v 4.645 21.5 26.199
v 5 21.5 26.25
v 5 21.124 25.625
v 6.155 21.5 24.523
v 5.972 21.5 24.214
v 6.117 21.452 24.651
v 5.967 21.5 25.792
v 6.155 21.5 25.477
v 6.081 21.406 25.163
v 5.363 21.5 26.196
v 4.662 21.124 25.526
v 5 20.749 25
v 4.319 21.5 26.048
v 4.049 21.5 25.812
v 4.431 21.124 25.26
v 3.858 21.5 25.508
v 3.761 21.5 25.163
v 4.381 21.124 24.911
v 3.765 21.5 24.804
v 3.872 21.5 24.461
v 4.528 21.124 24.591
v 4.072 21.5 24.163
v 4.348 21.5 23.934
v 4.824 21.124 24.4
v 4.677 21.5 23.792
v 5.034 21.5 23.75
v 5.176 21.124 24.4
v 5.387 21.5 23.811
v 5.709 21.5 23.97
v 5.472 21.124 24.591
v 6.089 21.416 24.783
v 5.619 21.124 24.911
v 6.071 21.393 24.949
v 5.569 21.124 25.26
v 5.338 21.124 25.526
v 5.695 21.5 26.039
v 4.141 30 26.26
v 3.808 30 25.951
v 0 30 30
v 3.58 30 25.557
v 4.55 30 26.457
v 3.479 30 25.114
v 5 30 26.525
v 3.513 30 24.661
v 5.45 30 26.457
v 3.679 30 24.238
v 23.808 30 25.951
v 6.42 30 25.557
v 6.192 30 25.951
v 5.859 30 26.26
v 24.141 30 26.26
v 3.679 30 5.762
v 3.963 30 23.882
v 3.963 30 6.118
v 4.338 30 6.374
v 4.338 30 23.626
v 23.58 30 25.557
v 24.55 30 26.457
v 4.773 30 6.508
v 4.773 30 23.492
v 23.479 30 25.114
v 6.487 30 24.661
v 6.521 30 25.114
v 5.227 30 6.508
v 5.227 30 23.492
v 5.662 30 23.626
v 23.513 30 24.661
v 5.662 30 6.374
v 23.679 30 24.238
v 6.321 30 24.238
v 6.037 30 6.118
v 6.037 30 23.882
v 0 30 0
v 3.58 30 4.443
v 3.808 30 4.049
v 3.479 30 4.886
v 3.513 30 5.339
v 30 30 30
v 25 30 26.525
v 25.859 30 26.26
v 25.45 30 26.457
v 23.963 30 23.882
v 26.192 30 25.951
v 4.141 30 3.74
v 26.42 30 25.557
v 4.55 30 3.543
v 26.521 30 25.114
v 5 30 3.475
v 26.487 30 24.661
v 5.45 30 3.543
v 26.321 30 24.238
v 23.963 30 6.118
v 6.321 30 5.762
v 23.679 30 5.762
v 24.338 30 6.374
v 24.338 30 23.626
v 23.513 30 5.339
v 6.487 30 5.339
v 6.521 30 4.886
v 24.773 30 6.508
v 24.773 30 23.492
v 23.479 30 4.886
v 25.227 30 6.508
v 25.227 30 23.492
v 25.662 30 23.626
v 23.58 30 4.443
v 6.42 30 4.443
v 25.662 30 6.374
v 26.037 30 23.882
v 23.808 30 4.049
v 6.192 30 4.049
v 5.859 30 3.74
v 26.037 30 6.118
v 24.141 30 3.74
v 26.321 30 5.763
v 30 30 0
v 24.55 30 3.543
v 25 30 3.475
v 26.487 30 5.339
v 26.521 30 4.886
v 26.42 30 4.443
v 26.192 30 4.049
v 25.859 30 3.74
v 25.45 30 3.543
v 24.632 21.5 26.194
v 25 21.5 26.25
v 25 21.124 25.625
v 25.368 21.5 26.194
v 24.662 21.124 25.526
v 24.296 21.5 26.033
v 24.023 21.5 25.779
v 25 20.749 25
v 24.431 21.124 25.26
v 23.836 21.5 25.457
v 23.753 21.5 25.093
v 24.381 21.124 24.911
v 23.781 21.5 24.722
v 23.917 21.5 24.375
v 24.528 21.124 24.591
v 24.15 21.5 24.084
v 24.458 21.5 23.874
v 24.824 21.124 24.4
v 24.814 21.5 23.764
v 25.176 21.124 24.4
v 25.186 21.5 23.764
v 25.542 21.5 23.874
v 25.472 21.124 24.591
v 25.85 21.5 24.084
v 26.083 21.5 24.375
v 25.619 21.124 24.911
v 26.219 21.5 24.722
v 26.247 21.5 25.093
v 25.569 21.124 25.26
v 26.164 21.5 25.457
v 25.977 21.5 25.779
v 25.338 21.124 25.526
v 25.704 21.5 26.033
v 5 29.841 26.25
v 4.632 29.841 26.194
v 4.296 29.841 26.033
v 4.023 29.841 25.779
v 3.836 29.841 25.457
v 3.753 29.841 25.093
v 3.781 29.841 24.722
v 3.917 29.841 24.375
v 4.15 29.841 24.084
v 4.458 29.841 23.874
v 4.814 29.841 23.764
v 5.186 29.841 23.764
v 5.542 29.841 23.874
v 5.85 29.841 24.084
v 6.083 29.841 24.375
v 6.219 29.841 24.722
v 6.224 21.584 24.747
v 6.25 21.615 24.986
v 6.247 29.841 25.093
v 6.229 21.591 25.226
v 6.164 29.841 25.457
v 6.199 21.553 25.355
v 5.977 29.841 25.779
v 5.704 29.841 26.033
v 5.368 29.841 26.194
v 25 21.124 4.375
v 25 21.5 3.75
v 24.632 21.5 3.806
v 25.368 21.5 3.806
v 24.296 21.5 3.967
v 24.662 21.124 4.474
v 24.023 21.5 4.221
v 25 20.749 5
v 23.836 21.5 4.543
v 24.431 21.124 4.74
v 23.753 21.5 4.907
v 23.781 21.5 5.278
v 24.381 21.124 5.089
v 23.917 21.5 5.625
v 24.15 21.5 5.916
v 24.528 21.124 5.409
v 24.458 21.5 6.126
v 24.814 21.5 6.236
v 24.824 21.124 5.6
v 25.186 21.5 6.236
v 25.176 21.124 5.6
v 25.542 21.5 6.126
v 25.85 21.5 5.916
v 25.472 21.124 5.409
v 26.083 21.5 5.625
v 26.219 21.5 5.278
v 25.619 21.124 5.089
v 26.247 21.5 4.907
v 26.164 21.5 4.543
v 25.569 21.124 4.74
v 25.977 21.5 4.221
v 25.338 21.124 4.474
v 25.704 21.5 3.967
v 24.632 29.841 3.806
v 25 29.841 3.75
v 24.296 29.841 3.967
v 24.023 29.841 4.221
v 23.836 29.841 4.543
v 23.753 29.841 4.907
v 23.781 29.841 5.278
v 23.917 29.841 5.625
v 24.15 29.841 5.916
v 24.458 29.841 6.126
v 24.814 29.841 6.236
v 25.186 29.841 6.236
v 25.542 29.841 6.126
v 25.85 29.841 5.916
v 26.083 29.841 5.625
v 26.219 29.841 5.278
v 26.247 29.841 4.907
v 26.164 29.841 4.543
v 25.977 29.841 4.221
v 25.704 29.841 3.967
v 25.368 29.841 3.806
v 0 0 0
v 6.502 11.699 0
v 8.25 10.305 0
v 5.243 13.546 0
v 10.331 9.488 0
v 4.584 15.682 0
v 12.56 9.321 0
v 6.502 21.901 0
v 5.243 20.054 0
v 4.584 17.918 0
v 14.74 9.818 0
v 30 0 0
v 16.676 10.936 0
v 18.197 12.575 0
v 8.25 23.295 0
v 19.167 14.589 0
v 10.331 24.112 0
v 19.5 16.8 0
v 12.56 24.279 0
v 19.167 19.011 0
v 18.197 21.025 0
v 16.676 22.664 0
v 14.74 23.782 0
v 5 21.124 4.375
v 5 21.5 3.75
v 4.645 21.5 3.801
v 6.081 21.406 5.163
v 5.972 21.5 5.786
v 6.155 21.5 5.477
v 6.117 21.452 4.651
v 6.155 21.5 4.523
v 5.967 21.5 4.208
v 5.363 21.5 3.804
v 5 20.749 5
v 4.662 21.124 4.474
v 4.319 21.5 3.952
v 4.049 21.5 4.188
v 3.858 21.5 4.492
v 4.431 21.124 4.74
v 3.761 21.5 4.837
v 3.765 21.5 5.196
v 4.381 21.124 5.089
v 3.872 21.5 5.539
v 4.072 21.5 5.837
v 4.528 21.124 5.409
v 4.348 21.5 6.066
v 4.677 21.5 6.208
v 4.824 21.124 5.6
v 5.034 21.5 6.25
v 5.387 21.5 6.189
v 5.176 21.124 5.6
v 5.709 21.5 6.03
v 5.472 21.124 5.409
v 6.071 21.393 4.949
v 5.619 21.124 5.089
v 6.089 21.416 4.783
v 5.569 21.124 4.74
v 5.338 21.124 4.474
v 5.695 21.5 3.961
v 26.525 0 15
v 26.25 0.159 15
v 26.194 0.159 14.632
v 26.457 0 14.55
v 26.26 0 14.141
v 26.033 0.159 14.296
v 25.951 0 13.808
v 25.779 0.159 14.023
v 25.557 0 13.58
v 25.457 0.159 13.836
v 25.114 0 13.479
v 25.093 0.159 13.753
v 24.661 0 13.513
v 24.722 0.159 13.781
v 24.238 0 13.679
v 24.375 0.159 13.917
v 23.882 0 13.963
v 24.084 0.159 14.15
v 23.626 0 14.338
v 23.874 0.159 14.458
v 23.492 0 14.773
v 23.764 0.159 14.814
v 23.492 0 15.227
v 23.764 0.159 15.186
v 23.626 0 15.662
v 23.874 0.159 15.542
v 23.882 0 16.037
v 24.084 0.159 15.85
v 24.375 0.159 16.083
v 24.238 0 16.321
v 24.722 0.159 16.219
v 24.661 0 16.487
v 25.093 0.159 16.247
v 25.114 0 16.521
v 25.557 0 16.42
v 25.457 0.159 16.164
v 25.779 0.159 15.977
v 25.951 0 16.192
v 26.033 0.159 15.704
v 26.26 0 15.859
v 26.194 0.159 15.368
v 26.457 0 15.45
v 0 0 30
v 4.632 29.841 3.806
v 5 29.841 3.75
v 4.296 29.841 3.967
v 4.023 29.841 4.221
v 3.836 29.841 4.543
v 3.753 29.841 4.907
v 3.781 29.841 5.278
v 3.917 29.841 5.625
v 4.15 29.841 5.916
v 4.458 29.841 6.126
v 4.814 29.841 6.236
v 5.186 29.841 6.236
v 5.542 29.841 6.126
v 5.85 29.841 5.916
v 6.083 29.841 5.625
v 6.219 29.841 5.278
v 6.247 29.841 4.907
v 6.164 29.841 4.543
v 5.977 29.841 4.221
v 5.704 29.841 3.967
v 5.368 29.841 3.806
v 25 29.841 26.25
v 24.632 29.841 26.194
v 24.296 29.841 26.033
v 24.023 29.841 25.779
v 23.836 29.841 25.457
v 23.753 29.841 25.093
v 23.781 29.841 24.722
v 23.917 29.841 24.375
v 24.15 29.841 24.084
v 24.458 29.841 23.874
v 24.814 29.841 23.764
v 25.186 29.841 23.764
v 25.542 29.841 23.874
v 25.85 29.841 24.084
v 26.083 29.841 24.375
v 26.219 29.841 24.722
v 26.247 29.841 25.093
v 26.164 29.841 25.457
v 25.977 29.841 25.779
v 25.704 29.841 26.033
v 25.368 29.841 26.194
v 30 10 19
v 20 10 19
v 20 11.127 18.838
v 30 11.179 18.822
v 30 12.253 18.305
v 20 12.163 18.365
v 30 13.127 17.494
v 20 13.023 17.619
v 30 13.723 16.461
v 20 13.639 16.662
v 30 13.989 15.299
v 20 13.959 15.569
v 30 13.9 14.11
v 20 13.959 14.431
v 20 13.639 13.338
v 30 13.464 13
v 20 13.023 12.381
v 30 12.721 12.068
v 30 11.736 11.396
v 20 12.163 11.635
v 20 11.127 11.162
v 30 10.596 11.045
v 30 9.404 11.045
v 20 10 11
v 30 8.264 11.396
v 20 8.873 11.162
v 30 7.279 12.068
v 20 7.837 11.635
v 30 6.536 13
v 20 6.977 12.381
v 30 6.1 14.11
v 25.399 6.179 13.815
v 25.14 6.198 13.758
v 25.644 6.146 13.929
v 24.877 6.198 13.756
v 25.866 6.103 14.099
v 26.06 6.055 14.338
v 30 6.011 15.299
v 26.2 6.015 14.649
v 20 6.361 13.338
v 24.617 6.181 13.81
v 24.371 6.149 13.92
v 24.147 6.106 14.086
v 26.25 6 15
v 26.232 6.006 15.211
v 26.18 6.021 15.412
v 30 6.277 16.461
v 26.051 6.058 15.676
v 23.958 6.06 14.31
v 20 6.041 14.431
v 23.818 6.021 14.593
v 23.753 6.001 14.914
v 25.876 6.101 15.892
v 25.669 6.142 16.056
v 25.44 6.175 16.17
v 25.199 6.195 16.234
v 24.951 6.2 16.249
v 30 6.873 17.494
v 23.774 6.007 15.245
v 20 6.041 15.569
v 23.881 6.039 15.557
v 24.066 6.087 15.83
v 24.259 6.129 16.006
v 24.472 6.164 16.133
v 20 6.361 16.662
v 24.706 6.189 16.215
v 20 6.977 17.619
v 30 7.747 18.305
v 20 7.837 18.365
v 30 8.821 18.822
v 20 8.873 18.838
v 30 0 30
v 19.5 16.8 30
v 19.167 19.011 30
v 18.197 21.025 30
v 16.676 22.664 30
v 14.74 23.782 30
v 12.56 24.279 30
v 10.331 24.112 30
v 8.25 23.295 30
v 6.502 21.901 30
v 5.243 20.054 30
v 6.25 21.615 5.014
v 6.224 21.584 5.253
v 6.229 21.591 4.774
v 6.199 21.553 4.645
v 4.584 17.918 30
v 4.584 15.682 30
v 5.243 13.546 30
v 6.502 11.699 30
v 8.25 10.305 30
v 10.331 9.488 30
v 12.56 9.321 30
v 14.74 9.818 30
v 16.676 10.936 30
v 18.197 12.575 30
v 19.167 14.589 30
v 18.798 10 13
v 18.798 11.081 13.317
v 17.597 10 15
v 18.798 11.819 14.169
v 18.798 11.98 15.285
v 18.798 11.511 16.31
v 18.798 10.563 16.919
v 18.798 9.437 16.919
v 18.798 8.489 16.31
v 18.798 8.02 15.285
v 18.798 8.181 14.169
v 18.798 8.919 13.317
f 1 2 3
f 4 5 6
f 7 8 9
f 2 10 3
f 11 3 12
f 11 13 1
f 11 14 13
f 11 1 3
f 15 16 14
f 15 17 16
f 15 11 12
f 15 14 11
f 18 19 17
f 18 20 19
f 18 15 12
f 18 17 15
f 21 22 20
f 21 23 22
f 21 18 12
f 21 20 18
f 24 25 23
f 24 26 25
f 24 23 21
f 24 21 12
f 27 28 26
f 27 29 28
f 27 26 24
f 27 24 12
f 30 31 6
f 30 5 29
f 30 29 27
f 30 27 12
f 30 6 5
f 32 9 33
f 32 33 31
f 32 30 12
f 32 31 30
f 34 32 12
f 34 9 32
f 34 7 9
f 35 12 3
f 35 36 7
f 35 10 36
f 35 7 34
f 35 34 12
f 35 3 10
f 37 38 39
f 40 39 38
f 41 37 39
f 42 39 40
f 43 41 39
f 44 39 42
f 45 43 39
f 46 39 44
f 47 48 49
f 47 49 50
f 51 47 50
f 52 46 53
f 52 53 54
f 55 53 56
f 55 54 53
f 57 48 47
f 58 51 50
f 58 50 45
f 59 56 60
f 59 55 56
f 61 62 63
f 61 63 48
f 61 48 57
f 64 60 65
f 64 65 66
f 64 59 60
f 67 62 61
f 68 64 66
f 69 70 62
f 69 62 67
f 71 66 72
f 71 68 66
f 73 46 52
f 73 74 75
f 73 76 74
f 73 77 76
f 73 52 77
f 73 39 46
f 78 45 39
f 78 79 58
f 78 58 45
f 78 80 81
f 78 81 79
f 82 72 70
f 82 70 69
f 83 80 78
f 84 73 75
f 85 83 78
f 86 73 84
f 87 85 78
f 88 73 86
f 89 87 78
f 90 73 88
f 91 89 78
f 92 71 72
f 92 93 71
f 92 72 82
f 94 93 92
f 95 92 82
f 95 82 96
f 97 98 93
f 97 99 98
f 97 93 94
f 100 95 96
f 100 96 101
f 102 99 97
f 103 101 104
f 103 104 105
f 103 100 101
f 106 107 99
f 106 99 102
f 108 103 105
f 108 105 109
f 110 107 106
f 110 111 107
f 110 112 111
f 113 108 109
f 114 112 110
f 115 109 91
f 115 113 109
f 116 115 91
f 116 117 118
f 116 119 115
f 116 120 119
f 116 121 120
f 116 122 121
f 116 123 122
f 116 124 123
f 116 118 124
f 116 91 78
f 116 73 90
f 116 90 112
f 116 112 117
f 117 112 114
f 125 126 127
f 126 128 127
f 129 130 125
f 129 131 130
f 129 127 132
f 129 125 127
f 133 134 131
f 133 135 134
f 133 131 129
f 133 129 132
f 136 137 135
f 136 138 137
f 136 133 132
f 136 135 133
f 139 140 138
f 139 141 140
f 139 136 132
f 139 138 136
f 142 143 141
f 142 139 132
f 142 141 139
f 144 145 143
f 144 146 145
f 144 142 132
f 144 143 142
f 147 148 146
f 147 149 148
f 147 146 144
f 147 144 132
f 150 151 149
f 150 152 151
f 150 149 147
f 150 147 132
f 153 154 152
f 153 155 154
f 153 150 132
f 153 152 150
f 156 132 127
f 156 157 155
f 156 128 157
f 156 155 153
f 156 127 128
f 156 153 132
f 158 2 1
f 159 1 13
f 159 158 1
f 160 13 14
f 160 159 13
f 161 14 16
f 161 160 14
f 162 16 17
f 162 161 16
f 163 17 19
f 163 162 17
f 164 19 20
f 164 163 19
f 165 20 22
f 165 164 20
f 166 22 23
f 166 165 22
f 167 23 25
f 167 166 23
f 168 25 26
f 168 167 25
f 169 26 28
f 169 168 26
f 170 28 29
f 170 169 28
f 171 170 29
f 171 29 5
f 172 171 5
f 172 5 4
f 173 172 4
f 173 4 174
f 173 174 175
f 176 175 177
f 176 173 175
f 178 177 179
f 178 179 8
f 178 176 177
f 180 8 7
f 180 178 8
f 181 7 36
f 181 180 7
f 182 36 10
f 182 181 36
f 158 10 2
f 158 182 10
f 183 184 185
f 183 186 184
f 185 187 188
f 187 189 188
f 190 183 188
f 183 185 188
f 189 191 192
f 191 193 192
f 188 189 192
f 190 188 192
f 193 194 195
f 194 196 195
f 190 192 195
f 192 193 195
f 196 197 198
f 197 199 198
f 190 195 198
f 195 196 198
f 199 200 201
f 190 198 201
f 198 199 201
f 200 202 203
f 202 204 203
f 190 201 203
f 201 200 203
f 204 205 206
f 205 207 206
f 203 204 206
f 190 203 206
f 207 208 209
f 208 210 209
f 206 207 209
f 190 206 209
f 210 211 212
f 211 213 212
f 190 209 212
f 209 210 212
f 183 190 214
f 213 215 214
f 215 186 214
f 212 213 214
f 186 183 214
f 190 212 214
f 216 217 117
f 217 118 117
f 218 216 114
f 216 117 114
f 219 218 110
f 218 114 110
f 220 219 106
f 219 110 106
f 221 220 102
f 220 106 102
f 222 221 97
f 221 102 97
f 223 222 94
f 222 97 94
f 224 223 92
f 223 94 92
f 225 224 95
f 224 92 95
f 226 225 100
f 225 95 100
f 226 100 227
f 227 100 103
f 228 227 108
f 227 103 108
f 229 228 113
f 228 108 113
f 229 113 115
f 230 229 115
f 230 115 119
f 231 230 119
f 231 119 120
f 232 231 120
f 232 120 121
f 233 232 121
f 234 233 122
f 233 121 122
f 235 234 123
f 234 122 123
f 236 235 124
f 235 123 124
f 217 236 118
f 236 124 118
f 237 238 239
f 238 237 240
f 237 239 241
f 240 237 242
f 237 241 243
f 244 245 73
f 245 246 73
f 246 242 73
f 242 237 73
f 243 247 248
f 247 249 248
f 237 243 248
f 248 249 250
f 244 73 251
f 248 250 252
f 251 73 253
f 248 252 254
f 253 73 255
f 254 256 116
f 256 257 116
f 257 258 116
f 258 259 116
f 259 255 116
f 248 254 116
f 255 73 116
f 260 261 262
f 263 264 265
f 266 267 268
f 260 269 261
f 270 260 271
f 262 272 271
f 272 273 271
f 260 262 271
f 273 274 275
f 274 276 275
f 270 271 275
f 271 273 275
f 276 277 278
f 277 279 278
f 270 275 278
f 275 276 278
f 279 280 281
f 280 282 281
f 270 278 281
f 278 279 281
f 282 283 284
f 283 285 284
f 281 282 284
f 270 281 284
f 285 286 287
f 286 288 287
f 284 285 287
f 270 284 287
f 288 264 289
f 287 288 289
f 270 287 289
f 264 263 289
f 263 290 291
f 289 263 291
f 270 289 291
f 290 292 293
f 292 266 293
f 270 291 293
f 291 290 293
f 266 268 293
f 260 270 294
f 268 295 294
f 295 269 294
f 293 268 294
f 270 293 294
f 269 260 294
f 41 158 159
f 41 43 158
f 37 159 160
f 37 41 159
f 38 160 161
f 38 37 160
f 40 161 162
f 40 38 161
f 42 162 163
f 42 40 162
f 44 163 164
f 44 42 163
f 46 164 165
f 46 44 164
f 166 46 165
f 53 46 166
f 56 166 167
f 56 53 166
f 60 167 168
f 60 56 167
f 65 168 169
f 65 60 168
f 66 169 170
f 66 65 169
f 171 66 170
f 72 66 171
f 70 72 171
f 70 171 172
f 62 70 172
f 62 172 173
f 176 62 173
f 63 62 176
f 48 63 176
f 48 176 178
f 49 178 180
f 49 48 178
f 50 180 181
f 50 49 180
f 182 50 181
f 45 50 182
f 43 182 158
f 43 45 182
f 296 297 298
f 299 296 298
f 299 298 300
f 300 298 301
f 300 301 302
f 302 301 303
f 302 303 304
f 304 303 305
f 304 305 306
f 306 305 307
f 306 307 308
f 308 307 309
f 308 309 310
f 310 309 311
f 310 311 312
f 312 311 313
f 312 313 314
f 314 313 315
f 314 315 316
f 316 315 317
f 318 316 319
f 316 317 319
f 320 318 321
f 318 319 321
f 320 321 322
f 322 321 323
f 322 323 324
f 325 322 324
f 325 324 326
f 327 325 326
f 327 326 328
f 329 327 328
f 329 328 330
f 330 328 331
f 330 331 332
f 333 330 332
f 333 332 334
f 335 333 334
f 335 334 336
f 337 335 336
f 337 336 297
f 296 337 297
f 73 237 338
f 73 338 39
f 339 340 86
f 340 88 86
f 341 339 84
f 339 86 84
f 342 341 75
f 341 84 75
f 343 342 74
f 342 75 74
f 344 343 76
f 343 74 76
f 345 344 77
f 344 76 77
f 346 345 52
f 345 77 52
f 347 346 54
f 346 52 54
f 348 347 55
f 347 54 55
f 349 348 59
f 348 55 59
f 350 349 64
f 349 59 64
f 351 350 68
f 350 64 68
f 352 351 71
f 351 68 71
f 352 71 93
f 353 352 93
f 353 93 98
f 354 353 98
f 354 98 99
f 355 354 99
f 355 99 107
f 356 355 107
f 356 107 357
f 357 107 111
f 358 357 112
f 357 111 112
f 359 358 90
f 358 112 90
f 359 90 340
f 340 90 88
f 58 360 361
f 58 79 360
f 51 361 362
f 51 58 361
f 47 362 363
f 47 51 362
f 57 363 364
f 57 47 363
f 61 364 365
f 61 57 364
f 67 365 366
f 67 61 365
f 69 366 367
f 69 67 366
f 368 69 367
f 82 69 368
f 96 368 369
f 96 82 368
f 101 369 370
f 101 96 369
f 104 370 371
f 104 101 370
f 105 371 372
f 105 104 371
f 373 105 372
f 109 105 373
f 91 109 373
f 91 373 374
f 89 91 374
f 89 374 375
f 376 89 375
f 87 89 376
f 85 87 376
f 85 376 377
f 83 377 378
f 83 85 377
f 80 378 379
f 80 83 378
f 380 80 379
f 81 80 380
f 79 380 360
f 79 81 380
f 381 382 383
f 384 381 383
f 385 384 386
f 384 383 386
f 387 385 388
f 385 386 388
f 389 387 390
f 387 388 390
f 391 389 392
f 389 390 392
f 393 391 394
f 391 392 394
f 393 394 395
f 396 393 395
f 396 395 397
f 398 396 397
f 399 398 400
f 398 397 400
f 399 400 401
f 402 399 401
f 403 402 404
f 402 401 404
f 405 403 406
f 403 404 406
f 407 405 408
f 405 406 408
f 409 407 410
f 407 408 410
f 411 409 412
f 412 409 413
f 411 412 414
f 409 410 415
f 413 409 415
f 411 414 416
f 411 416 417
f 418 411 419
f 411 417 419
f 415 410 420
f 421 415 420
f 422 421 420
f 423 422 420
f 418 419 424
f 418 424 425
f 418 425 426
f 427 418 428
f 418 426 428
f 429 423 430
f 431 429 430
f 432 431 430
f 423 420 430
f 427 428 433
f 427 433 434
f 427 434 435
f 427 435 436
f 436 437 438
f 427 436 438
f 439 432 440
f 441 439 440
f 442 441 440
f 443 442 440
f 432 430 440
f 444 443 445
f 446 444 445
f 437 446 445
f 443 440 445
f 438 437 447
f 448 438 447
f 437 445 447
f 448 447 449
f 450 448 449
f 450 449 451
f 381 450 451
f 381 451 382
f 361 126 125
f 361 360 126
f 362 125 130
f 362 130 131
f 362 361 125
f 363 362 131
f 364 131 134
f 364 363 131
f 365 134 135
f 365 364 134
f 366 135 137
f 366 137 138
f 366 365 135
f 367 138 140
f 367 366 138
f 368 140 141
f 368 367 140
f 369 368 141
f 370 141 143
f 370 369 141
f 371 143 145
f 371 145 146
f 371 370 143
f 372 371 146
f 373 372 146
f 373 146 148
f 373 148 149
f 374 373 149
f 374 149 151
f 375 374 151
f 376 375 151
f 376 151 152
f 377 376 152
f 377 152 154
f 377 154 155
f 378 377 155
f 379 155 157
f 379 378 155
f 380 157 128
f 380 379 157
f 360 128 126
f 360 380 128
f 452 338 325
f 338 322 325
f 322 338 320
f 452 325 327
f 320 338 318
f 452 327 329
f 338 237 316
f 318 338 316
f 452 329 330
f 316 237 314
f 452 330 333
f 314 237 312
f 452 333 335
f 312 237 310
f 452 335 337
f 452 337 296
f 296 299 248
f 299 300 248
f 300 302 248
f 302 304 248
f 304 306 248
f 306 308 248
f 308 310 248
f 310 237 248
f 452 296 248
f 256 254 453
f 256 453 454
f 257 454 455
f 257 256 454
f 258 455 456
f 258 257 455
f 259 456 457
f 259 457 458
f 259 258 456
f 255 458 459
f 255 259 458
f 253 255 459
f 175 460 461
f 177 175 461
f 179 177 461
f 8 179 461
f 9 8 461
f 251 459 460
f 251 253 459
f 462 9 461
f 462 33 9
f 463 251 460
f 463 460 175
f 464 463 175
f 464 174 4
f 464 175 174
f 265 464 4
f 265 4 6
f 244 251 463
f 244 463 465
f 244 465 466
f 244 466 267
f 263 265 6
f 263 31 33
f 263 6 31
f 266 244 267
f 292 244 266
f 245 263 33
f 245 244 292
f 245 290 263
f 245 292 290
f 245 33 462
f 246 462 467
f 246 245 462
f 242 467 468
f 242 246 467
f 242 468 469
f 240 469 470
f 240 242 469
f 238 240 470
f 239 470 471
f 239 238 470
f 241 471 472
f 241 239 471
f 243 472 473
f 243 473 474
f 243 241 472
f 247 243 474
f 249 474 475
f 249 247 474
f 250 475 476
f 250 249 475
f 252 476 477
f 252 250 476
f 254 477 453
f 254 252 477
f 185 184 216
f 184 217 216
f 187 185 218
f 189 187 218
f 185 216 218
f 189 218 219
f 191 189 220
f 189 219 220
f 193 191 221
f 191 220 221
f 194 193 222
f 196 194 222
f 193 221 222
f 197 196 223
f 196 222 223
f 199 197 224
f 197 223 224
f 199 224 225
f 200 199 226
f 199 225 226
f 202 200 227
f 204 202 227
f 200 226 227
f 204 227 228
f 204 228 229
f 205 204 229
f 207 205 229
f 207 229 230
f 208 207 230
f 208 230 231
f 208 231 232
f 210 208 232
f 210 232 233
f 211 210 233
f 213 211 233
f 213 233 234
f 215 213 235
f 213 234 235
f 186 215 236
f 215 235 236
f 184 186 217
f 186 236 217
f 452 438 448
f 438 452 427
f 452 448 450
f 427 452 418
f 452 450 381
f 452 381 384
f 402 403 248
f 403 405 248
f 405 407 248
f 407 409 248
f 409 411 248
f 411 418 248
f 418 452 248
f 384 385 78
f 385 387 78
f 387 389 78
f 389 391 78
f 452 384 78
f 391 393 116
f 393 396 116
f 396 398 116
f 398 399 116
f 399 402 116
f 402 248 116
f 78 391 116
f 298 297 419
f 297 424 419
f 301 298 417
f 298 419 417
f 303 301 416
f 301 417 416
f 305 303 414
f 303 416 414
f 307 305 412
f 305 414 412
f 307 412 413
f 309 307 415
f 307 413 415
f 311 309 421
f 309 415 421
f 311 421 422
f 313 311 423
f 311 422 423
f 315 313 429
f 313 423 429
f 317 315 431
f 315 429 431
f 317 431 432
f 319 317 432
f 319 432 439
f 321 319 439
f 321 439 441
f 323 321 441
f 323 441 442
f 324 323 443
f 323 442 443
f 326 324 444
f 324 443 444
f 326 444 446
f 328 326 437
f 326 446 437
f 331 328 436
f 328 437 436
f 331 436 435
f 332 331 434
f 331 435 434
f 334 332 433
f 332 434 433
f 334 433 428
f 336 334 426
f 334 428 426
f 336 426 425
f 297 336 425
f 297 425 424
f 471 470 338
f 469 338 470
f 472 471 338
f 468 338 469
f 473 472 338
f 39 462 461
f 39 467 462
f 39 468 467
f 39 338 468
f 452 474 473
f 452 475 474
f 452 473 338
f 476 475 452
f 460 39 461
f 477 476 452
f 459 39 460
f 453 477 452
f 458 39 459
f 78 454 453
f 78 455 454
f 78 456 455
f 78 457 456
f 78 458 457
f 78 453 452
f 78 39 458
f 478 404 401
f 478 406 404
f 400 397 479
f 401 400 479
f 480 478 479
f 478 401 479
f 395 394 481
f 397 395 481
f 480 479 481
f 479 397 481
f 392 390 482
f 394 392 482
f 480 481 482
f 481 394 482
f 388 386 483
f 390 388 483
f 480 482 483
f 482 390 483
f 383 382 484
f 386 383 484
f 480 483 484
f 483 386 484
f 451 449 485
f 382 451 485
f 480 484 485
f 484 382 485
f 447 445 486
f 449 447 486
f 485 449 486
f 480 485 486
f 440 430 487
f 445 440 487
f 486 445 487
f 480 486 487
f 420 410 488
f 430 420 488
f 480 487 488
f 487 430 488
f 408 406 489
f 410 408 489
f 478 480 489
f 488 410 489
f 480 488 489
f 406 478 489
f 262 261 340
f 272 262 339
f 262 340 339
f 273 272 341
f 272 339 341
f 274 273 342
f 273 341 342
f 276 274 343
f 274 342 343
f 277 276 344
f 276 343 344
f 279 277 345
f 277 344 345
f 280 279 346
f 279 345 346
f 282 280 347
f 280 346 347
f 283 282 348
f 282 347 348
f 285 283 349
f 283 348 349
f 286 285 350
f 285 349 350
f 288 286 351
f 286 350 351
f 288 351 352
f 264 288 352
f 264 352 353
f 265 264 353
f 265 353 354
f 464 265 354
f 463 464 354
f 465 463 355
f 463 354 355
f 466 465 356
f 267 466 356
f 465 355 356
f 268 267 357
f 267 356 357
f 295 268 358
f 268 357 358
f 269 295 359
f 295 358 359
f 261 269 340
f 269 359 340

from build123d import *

# Parameters (mm, degrees)
SCHIZZO1_W                      = 30
SCHIZZO1_H                      = 30
SCHIZZO1_R                      = 7.5
ESTRUSIONE_ESTRUSIONE1_DEPTH    = 30
FORO_8_0_8_1_D                  = 8
FORO_8_0_8_1_DEPTH              = 10
FORO_8_0_8_1_TIP                = 2.403442476
FORO_FILETTATO_M3_1_AT_2_COUNT  = 2
FORO_FILETTATO_M3_1_AT_2_PITCH  = 20
FORO_FILETTATO_M3_2_D           = 2.5
FORO_FILETTATO_M3_2_DEPTH       = 8.5
FORO_FILETTATO_M3_2_CSINK_D     = 3.05
FORO_FILETTATO_M3_2_CSINK_ANGLE = 120
FORO_FILETTATO_M3_2_TIP         = 0.751075774


with BuildPart() as part:
    # Schizzo1 → Estrusione-Estrusione1 (new body)
    with BuildSketch(Plane.XY):
        with Locations((15, 15)):
            Rectangle(SCHIZZO1_W, SCHIZZO1_H)
        with Locations((12, 16.8)):
            Circle(SCHIZZO1_R, mode=Mode.SUBTRACT)
    extrude(amount=ESTRUSIONE_ESTRUSIONE1_DEPTH)

    # Foro Ø8.0 (8)-1
    with Locations(Plane(origin=(30, 0, 0), x_dir=(0, 0, -1), z_dir=(1, 0, 0))):
        with Locations((-15, 10)):
            Hole(FORO_8_0_8_1_D / 2, depth=FORO_8_0_8_1_DEPTH)
            with Locations((0, 0, -(FORO_8_0_8_1_DEPTH + FORO_8_0_8_1_TIP / 2))):  # 118° drill point
                Cone(0, FORO_8_0_8_1_D / 2, FORO_8_0_8_1_TIP, mode=Mode.SUBTRACT)

    # Schizzo7 → Foro filettato M3-1 (revolve, cut)
    with BuildSketch(Plane(origin=(5, 30, 25), x_dir=(0, 0, 1), z_dir=(1, 0, 0))):
        Polygon((0, 0), (0, 9.251075774), (1.25, 8.5), (1.25, 0.158771324), (1.525, 0), align=None)
    foro_filettato_m3_1 = revolve(axis=Axis((5, 36.35, 25), (0, -1, 0)), mode=Mode.SUBTRACT)

    # Foro filettato M3-1 at 2: Foro filettato M3-1 ×2
    with Locations(*[(i * FORO_FILETTATO_M3_1_AT_2_PITCH, 0, 0) for i in range(1, FORO_FILETTATO_M3_1_AT_2_COUNT)]):
        add(foro_filettato_m3_1, mode=Mode.SUBTRACT)

    # Specchia1: Foro filettato M3-1 across plane
    add(foro_filettato_m3_1.mirror(Plane.XY.offset(15)), mode=Mode.SUBTRACT)

    # Specchia1 copy 1 sketch → Specchia1 copy 1 (revolve, cut)
    with BuildSketch(Plane(origin=(25, 30, 5), x_dir=(0, 0, -1), z_dir=(1, 0, 0))):
        Polygon((0, 0), (0, -9.251075774), (1.25, -8.5), (1.25, -0.158771324), (1.525, 0), align=None)
    revolve(axis=Axis((25, 36.35, 5), (0, 1, 0)), mode=Mode.SUBTRACT)

    # Foro filettato M3-2
    with Locations(Plane(origin=(0, 0, 0), x_dir=(-1, 0, 0), z_dir=(0, -1, 0))):
        with Locations((-25, -15)):
            CounterSinkHole(FORO_FILETTATO_M3_2_D / 2, FORO_FILETTATO_M3_2_CSINK_D / 2, depth=FORO_FILETTATO_M3_2_DEPTH, counter_sink_angle=FORO_FILETTATO_M3_2_CSINK_ANGLE)
            with Locations((0, 0, -(FORO_FILETTATO_M3_2_DEPTH + FORO_FILETTATO_M3_2_TIP / 2))):  # 118° drill point
                Cone(0, FORO_FILETTATO_M3_2_D / 2, FORO_FILETTATO_M3_2_TIP, mode=Mode.SUBTRACT)


solid = part.part
